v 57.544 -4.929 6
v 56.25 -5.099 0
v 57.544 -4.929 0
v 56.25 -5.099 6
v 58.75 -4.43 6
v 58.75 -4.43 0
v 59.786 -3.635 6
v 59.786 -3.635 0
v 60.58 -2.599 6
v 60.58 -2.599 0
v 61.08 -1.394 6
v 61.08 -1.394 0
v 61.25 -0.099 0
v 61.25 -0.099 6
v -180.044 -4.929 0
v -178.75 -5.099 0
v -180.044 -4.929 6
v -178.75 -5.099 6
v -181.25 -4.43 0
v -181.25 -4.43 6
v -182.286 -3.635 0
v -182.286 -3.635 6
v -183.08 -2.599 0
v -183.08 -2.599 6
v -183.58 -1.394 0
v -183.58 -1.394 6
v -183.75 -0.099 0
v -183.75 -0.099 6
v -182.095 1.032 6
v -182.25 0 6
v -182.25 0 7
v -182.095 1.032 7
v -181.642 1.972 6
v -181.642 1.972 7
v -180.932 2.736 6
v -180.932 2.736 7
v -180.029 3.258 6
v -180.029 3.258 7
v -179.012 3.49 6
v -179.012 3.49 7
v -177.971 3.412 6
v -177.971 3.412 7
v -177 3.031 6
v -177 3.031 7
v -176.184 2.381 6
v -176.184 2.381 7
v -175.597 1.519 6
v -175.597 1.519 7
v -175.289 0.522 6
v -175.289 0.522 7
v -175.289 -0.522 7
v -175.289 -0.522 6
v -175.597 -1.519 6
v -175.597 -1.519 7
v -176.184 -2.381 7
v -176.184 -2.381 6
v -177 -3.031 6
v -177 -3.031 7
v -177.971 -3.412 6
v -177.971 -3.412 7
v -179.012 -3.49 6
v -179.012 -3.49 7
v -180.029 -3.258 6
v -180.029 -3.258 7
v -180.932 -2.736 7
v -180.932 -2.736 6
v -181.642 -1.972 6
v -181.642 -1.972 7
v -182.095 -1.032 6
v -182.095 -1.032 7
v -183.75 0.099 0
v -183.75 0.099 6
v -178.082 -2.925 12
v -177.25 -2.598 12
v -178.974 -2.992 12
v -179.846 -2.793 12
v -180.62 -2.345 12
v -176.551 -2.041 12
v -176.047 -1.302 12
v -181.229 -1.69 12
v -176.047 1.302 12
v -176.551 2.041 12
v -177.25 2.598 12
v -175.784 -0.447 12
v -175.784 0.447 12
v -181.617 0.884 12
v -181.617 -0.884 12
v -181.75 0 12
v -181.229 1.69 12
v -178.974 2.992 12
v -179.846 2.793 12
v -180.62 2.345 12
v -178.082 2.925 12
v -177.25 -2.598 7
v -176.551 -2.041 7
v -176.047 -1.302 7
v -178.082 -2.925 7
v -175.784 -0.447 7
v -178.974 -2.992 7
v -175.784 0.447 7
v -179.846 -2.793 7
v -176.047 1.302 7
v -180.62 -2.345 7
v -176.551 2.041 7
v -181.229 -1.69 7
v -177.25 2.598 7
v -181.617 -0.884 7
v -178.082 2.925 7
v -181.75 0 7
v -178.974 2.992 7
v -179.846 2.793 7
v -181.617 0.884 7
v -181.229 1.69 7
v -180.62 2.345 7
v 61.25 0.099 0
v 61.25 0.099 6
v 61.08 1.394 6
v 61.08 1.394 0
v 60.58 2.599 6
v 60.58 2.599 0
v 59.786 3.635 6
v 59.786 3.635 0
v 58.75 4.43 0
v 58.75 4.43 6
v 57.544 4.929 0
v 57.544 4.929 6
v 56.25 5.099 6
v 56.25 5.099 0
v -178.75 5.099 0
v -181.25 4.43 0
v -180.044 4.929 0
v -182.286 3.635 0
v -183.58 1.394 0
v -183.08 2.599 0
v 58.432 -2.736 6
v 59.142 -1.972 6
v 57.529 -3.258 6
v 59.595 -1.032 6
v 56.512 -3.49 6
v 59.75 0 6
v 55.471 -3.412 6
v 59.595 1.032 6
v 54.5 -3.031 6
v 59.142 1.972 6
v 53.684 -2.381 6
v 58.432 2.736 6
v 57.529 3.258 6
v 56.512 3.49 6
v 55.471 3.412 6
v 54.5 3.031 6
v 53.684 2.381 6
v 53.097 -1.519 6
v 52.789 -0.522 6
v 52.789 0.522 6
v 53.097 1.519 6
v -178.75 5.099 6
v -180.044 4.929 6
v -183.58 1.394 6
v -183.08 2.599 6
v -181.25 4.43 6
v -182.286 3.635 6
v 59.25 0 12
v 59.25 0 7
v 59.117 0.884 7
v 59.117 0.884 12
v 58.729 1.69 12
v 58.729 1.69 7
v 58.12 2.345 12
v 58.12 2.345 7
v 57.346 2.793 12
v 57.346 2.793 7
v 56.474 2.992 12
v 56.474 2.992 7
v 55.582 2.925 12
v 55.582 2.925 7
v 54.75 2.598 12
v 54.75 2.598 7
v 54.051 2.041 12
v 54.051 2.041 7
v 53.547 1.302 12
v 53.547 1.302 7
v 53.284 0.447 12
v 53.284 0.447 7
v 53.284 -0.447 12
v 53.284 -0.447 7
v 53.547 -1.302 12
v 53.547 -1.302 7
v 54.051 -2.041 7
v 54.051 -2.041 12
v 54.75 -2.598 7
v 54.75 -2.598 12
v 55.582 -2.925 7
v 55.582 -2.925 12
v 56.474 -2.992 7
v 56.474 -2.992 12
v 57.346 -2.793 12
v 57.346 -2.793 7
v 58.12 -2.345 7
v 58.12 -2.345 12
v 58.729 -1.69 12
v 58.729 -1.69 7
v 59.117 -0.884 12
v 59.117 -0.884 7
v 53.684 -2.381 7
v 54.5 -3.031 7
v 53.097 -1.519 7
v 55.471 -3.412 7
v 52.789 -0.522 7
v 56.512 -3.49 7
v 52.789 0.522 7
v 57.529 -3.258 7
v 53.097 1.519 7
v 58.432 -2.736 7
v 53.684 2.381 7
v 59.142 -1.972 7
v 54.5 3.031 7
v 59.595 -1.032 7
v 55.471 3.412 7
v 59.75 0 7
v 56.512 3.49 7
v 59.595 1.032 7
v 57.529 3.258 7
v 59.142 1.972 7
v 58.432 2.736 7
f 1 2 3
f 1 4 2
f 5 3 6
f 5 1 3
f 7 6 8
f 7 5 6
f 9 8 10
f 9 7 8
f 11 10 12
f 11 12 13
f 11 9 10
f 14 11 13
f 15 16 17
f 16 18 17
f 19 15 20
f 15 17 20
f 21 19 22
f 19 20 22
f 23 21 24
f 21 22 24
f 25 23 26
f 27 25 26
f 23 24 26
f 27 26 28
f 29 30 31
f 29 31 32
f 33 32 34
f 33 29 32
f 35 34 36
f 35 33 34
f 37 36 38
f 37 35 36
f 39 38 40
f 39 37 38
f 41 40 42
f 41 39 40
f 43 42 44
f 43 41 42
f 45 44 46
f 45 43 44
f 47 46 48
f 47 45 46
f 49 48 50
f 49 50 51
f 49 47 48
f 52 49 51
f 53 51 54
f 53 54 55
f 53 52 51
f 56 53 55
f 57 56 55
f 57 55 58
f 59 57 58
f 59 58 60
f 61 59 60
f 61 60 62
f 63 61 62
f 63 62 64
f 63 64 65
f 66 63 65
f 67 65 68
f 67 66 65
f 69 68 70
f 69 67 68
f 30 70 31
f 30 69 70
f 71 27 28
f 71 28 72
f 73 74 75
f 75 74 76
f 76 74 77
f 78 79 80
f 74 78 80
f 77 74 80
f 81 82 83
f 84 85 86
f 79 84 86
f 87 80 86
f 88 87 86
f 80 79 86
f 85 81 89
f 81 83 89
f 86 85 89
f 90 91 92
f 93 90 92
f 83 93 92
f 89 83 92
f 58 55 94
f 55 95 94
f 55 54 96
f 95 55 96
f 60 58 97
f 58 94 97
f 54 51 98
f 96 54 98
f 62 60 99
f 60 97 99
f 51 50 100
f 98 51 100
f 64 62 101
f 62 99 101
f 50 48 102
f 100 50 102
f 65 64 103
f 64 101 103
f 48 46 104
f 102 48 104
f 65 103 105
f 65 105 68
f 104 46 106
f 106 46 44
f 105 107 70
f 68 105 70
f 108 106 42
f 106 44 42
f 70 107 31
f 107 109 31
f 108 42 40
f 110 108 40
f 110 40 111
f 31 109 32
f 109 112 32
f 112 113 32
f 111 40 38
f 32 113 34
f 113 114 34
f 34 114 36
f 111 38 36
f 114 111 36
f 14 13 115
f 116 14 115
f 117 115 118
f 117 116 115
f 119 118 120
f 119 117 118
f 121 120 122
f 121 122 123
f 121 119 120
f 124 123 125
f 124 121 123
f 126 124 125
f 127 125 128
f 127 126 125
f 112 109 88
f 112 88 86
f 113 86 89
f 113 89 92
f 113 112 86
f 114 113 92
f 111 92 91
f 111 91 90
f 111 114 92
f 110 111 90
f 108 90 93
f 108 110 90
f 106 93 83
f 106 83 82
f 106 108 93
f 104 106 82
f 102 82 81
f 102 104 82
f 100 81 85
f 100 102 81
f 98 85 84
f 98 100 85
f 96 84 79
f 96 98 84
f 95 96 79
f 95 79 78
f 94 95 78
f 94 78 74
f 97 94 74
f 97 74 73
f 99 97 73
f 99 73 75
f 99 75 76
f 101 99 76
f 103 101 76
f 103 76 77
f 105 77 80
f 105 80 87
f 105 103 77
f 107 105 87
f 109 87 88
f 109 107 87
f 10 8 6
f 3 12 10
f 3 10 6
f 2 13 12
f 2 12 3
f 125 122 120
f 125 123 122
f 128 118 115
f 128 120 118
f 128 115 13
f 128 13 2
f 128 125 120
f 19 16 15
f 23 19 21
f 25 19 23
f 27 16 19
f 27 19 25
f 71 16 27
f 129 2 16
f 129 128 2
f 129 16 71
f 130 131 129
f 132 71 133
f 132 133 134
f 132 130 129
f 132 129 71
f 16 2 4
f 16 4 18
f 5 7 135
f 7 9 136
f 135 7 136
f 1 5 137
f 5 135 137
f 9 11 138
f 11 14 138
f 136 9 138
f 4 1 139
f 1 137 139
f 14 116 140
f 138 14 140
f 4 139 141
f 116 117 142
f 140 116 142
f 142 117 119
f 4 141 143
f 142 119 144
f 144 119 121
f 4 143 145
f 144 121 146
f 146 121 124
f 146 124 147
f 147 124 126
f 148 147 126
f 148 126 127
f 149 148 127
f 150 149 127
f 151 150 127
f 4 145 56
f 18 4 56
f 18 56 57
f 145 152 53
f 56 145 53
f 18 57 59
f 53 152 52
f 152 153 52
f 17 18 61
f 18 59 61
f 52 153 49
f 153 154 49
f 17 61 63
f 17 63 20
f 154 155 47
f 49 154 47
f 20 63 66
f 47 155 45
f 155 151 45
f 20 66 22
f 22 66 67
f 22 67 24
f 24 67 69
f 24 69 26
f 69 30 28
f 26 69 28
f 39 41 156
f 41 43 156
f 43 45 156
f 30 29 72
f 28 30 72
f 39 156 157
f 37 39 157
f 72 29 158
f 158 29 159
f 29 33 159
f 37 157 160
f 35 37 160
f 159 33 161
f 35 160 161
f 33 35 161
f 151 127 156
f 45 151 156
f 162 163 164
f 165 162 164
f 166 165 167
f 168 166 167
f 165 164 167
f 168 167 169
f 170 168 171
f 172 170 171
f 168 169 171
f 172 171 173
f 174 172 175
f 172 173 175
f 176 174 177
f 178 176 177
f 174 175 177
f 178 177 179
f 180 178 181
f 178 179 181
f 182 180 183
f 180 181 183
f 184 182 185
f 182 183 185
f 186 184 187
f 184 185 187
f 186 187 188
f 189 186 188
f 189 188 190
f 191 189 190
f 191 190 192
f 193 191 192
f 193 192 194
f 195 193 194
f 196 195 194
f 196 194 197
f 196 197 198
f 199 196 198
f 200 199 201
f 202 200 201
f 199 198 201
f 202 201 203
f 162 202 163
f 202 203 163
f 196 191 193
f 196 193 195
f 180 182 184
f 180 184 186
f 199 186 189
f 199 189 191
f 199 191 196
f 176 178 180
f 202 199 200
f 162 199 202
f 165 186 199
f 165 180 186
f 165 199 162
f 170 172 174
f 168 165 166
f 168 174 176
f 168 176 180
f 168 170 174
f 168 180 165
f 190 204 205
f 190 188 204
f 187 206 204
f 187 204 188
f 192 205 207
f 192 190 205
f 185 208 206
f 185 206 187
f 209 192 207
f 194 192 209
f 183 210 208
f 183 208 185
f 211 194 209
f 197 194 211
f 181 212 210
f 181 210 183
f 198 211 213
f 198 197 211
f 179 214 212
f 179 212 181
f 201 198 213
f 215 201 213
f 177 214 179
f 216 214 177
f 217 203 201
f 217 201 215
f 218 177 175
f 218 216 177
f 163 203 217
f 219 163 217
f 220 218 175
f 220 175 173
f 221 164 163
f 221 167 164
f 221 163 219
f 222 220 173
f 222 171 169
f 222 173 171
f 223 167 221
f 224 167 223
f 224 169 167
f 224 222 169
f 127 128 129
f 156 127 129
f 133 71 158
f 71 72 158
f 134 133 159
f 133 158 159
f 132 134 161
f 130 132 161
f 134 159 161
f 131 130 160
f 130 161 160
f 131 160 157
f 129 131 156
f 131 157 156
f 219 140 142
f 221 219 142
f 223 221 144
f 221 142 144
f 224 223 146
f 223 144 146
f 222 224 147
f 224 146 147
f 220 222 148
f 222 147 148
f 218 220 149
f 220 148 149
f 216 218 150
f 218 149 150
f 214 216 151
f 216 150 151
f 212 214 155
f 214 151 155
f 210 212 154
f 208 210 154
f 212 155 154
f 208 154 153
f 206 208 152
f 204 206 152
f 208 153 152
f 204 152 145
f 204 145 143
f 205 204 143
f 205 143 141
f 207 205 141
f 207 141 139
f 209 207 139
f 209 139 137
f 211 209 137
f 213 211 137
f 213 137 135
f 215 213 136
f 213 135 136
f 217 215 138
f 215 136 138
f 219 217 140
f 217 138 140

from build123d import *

# Parameters (mm, degrees)
SKETCH1_W            = 122.5
SKETCH1_H            = 10.198852772
BOSS_EXTRUDE1_DEPTH  = 6
FILLET1_R            = 5
SKETCH2_R            = 3.5
BOSS_EXTRUDE2_DEPTH  = 1
SKETCH3_R            = 3
BOSS_EXTRUDE3_DEPTH  = 5
FILLET1_OF_MIRROR1_R = 5


with BuildPart() as part:
    # Sketch1 → Boss-Extrude1 (new body)
    with BuildSketch(Plane.XY):
        Rectangle(SKETCH1_W, SKETCH1_H)
    boss_extrude1 = extrude(amount=BOSS_EXTRUDE1_DEPTH)

    # Fillet1
    fillet1_edges = [part.edges().sort_by_distance(p)[0] for p in [
        (61.25, -5.099426386, 3),
        (61.25, 5.099426386, 3),
    ]]
    fillet(fillet1_edges, radius=FILLET1_R)

    # Sketch2 → Boss-Extrude2 (add)
    with BuildSketch(Plane.XY.offset(6)):
        with Locations((56.25, 0)):
            Circle(SKETCH2_R)
    boss_extrude2 = extrude(amount=BOSS_EXTRUDE2_DEPTH)

    # Sketch3 → Boss-Extrude3 (add)
    with BuildSketch(Plane.XY.offset(7)):
        with Locations((56.25, 0)):
            Circle(SKETCH3_R)
    boss_extrude3 = extrude(amount=BOSS_EXTRUDE3_DEPTH)

    # Mirror1: Boss-Extrude1, Boss-Extrude2, Boss-Extrude3 across plane
    add(boss_extrude1.mirror(Plane(origin=(-61.25, 5.099426386, 6), x_dir=(0, 0, 1), z_dir=(1, 0, 0))))
    add(boss_extrude2.mirror(Plane(origin=(-61.25, 5.099426386, 6), x_dir=(0, 0, 1), z_dir=(1, 0, 0))))
    add(boss_extrude3.mirror(Plane(origin=(-61.25, 5.099426386, 6), x_dir=(0, 0, 1), z_dir=(1, 0, 0))))

    # Fillet1 of Mirror1
    fillet1_of_mirror1_edges = [part.edges().sort_by_distance(p)[0] for p in [
        (-183.75, -5.099426386, 3),
        (-183.75, 5.099426386, 3),
    ]]
    fillet(fillet1_of_mirror1_edges, radius=FILLET1_OF_MIRROR1_R)


solid = part.part
